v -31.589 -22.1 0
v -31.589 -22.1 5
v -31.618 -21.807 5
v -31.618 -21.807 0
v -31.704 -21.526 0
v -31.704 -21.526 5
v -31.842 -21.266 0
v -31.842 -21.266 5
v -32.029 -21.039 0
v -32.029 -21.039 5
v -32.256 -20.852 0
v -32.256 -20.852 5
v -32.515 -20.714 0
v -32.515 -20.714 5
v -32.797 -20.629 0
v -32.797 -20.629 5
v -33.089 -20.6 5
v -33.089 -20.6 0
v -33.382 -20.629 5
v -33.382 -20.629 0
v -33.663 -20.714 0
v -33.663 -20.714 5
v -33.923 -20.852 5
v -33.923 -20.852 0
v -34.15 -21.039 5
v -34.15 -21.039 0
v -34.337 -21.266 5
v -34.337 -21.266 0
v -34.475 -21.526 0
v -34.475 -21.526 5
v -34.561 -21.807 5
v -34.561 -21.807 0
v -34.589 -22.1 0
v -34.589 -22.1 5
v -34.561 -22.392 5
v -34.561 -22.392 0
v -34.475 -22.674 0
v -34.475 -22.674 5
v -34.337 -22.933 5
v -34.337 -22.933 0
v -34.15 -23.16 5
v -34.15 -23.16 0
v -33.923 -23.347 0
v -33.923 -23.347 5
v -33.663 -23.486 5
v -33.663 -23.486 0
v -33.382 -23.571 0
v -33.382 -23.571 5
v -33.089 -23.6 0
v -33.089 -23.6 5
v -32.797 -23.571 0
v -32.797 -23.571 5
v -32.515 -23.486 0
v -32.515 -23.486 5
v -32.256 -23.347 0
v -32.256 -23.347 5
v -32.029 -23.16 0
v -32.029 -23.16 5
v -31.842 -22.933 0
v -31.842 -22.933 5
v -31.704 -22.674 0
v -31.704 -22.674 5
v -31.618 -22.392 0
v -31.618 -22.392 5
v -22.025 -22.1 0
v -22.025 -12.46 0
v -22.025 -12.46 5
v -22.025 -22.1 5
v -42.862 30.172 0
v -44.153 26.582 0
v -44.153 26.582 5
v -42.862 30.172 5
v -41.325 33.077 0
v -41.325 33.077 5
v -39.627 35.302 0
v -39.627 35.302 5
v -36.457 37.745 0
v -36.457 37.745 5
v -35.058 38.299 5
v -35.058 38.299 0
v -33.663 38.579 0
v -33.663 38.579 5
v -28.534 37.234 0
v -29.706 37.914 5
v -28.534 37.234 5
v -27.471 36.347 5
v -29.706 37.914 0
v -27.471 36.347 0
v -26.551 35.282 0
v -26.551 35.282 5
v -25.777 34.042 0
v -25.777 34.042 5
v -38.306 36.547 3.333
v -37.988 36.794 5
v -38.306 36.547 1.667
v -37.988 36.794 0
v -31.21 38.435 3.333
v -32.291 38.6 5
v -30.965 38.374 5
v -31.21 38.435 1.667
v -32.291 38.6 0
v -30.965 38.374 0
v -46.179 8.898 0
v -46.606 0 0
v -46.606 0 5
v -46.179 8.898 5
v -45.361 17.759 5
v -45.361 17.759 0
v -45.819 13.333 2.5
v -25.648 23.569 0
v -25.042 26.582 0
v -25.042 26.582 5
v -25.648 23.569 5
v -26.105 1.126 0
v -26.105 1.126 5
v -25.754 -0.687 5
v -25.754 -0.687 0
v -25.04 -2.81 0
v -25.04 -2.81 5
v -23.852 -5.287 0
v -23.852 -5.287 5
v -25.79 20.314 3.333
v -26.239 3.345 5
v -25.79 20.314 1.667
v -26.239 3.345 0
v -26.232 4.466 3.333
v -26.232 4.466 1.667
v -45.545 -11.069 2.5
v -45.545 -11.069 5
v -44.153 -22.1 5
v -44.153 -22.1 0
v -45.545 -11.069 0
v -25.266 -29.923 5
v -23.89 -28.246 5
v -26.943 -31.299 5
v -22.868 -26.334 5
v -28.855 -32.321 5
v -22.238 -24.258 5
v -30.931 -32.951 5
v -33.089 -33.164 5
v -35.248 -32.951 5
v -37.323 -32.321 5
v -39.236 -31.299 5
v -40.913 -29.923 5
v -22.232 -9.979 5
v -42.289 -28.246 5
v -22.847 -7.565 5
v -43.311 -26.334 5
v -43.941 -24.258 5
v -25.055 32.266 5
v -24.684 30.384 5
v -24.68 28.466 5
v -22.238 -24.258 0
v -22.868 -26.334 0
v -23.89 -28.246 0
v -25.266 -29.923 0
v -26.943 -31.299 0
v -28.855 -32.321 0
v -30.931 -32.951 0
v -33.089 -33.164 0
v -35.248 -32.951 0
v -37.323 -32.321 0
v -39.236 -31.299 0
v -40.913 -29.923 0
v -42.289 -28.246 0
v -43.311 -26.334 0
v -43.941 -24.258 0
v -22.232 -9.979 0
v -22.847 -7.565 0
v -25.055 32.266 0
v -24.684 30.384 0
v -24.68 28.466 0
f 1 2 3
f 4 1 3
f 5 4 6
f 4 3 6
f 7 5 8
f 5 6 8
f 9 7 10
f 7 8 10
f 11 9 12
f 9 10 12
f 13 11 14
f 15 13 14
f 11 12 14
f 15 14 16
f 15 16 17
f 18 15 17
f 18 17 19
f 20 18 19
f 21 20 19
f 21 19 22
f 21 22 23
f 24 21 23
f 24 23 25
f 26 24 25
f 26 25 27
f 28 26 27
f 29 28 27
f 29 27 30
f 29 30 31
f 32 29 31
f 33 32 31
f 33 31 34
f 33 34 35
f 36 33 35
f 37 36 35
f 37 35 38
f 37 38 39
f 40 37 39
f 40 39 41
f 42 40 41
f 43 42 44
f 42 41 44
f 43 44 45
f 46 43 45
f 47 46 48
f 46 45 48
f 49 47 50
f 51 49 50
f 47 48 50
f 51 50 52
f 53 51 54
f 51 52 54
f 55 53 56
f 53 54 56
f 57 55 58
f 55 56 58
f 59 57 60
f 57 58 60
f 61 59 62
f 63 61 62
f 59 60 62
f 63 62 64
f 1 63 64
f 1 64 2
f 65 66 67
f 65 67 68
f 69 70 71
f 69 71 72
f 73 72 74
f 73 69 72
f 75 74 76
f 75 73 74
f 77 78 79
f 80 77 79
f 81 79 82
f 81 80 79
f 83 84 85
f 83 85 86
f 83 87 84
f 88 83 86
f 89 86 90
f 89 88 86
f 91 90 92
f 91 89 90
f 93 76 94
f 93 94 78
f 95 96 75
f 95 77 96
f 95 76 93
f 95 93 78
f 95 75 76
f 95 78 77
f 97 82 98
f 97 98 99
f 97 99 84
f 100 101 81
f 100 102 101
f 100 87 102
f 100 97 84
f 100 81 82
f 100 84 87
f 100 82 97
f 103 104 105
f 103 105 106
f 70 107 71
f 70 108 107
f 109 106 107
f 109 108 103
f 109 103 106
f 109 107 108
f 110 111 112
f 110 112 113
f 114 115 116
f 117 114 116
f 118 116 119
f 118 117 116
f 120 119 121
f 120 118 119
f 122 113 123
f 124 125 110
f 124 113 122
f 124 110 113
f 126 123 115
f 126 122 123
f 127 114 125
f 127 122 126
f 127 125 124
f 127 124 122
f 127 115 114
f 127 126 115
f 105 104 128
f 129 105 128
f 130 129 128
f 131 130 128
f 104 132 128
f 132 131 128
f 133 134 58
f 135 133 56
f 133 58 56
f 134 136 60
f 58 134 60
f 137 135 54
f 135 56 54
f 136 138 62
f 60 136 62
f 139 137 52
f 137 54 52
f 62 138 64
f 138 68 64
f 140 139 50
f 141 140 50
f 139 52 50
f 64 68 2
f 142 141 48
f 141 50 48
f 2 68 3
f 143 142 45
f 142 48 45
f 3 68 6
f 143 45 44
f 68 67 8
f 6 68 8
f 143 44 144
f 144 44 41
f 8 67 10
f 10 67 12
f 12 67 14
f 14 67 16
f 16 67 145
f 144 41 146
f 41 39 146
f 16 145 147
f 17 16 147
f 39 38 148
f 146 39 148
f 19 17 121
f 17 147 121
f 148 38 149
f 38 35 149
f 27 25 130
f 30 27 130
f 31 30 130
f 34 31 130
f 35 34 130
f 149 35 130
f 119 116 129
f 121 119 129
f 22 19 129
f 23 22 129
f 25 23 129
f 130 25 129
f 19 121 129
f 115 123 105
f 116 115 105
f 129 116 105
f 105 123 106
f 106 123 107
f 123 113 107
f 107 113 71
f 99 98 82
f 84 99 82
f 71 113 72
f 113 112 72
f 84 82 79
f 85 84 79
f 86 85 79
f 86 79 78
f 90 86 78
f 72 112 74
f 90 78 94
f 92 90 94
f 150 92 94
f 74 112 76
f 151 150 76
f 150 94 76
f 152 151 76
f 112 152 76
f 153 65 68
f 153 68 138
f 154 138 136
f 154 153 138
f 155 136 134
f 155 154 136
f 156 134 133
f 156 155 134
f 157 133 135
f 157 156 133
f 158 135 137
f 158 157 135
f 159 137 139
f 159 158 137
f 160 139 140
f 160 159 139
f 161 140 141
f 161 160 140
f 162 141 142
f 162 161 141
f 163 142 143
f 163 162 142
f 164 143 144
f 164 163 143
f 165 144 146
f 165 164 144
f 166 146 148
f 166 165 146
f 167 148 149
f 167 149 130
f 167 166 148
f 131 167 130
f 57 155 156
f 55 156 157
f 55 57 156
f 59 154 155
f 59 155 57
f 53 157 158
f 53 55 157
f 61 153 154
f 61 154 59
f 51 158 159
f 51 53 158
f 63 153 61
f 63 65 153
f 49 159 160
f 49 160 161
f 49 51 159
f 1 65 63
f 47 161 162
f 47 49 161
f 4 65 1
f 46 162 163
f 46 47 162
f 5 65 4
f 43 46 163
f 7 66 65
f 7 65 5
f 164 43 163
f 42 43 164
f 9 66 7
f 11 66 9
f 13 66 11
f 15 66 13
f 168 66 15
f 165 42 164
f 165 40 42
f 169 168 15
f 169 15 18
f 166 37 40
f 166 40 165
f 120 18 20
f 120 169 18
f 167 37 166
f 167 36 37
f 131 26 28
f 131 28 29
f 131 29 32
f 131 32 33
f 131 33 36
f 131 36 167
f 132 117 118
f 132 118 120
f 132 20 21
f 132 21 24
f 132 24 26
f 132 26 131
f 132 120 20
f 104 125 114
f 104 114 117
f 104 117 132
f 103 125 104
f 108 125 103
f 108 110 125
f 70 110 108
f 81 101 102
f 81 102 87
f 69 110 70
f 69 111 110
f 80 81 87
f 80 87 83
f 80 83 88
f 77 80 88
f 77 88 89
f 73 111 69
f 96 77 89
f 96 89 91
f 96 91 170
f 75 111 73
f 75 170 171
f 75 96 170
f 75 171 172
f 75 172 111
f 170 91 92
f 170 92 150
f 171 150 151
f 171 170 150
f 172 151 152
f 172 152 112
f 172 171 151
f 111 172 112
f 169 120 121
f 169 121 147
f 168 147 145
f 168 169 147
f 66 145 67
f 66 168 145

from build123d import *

# Parameters (mm, degrees)
BOSS_EXTRUDE1_DEPTH = 5
SKETCH2_R           = 1.5
CUT_EXTRUDE1_DEPTH  = 15


with BuildPart() as part:
    # Sketch1 → Boss-Extrude1 (new body)
    with BuildSketch(Plane.XY):
        with BuildLine():
            Line((-22.025473837, -12.460288432), (-22.025473837, -22.099692602))
            ThreePointArc((-22.025473837, -22.099692602), (-33.089336525, -33.163555291), (-44.153199213, -22.099692602))
            add(Edge.make_bspline(
                [(-46.60586196, 0), (-45.711257539, -11.089055713), (-44.153199213, -22.099692602)],
                knots=[0, 0, 0, 1, 1, 1], degree=2))
            add(Edge.make_bspline(
                [(-46.60586196, 0), (-46.258692623, 13.374484171), (-44.153199213, 26.582155094)],
                knots=[0, 0, 0, 1, 1, 1], degree=2))
            add(Edge.make_bspline(
                [(-44.153199213, 26.582155094), (-39.900483867, 41.183407978), (-29.408706967, 40.976444126), (-25.777388315, 34.042216579)],
                knots=[0, 0, 0, 0, 0.860338307, 0.860338307, 0.860338307, 0.860338307], degree=3))
            ThreePointArc((-25.777388315, 34.042216579), (-24.684371632, 30.383671766), (-25.042291473, 26.582155094))
            add(Edge.make_bspline(
                [(-25.042291473, 26.582155094), (-25.760015873, 24.141164965), (-25.719709218, 19.504814476), (-26.307467845, 6.668994266), (-26.250257145, -0.88224048), (-23.851756529, -5.287201768)],
                knots=[0.083338388, 0.083338388, 0.083338388, 0.083338388, 0.311519057, 0.73939734, 0.959193523, 0.959193523, 0.959193523, 0.959193523], degree=3))
            ThreePointArc((-23.851756529, -5.287201768), (-22.489212976, -8.759326369), (-22.025473837, -12.460288432))
        make_face()
    extrude(amount=BOSS_EXTRUDE1_DEPTH)

    # Sketch2 → Cut-Extrude1 (cut)
    with BuildSketch(Plane.XY.offset(5)):
        with Locations((-33.089336525, -22.099692602)):
            Circle(SKETCH2_R)
    extrude(amount=-CUT_EXTRUDE1_DEPTH, mode=Mode.SUBTRACT)


solid = part.part
